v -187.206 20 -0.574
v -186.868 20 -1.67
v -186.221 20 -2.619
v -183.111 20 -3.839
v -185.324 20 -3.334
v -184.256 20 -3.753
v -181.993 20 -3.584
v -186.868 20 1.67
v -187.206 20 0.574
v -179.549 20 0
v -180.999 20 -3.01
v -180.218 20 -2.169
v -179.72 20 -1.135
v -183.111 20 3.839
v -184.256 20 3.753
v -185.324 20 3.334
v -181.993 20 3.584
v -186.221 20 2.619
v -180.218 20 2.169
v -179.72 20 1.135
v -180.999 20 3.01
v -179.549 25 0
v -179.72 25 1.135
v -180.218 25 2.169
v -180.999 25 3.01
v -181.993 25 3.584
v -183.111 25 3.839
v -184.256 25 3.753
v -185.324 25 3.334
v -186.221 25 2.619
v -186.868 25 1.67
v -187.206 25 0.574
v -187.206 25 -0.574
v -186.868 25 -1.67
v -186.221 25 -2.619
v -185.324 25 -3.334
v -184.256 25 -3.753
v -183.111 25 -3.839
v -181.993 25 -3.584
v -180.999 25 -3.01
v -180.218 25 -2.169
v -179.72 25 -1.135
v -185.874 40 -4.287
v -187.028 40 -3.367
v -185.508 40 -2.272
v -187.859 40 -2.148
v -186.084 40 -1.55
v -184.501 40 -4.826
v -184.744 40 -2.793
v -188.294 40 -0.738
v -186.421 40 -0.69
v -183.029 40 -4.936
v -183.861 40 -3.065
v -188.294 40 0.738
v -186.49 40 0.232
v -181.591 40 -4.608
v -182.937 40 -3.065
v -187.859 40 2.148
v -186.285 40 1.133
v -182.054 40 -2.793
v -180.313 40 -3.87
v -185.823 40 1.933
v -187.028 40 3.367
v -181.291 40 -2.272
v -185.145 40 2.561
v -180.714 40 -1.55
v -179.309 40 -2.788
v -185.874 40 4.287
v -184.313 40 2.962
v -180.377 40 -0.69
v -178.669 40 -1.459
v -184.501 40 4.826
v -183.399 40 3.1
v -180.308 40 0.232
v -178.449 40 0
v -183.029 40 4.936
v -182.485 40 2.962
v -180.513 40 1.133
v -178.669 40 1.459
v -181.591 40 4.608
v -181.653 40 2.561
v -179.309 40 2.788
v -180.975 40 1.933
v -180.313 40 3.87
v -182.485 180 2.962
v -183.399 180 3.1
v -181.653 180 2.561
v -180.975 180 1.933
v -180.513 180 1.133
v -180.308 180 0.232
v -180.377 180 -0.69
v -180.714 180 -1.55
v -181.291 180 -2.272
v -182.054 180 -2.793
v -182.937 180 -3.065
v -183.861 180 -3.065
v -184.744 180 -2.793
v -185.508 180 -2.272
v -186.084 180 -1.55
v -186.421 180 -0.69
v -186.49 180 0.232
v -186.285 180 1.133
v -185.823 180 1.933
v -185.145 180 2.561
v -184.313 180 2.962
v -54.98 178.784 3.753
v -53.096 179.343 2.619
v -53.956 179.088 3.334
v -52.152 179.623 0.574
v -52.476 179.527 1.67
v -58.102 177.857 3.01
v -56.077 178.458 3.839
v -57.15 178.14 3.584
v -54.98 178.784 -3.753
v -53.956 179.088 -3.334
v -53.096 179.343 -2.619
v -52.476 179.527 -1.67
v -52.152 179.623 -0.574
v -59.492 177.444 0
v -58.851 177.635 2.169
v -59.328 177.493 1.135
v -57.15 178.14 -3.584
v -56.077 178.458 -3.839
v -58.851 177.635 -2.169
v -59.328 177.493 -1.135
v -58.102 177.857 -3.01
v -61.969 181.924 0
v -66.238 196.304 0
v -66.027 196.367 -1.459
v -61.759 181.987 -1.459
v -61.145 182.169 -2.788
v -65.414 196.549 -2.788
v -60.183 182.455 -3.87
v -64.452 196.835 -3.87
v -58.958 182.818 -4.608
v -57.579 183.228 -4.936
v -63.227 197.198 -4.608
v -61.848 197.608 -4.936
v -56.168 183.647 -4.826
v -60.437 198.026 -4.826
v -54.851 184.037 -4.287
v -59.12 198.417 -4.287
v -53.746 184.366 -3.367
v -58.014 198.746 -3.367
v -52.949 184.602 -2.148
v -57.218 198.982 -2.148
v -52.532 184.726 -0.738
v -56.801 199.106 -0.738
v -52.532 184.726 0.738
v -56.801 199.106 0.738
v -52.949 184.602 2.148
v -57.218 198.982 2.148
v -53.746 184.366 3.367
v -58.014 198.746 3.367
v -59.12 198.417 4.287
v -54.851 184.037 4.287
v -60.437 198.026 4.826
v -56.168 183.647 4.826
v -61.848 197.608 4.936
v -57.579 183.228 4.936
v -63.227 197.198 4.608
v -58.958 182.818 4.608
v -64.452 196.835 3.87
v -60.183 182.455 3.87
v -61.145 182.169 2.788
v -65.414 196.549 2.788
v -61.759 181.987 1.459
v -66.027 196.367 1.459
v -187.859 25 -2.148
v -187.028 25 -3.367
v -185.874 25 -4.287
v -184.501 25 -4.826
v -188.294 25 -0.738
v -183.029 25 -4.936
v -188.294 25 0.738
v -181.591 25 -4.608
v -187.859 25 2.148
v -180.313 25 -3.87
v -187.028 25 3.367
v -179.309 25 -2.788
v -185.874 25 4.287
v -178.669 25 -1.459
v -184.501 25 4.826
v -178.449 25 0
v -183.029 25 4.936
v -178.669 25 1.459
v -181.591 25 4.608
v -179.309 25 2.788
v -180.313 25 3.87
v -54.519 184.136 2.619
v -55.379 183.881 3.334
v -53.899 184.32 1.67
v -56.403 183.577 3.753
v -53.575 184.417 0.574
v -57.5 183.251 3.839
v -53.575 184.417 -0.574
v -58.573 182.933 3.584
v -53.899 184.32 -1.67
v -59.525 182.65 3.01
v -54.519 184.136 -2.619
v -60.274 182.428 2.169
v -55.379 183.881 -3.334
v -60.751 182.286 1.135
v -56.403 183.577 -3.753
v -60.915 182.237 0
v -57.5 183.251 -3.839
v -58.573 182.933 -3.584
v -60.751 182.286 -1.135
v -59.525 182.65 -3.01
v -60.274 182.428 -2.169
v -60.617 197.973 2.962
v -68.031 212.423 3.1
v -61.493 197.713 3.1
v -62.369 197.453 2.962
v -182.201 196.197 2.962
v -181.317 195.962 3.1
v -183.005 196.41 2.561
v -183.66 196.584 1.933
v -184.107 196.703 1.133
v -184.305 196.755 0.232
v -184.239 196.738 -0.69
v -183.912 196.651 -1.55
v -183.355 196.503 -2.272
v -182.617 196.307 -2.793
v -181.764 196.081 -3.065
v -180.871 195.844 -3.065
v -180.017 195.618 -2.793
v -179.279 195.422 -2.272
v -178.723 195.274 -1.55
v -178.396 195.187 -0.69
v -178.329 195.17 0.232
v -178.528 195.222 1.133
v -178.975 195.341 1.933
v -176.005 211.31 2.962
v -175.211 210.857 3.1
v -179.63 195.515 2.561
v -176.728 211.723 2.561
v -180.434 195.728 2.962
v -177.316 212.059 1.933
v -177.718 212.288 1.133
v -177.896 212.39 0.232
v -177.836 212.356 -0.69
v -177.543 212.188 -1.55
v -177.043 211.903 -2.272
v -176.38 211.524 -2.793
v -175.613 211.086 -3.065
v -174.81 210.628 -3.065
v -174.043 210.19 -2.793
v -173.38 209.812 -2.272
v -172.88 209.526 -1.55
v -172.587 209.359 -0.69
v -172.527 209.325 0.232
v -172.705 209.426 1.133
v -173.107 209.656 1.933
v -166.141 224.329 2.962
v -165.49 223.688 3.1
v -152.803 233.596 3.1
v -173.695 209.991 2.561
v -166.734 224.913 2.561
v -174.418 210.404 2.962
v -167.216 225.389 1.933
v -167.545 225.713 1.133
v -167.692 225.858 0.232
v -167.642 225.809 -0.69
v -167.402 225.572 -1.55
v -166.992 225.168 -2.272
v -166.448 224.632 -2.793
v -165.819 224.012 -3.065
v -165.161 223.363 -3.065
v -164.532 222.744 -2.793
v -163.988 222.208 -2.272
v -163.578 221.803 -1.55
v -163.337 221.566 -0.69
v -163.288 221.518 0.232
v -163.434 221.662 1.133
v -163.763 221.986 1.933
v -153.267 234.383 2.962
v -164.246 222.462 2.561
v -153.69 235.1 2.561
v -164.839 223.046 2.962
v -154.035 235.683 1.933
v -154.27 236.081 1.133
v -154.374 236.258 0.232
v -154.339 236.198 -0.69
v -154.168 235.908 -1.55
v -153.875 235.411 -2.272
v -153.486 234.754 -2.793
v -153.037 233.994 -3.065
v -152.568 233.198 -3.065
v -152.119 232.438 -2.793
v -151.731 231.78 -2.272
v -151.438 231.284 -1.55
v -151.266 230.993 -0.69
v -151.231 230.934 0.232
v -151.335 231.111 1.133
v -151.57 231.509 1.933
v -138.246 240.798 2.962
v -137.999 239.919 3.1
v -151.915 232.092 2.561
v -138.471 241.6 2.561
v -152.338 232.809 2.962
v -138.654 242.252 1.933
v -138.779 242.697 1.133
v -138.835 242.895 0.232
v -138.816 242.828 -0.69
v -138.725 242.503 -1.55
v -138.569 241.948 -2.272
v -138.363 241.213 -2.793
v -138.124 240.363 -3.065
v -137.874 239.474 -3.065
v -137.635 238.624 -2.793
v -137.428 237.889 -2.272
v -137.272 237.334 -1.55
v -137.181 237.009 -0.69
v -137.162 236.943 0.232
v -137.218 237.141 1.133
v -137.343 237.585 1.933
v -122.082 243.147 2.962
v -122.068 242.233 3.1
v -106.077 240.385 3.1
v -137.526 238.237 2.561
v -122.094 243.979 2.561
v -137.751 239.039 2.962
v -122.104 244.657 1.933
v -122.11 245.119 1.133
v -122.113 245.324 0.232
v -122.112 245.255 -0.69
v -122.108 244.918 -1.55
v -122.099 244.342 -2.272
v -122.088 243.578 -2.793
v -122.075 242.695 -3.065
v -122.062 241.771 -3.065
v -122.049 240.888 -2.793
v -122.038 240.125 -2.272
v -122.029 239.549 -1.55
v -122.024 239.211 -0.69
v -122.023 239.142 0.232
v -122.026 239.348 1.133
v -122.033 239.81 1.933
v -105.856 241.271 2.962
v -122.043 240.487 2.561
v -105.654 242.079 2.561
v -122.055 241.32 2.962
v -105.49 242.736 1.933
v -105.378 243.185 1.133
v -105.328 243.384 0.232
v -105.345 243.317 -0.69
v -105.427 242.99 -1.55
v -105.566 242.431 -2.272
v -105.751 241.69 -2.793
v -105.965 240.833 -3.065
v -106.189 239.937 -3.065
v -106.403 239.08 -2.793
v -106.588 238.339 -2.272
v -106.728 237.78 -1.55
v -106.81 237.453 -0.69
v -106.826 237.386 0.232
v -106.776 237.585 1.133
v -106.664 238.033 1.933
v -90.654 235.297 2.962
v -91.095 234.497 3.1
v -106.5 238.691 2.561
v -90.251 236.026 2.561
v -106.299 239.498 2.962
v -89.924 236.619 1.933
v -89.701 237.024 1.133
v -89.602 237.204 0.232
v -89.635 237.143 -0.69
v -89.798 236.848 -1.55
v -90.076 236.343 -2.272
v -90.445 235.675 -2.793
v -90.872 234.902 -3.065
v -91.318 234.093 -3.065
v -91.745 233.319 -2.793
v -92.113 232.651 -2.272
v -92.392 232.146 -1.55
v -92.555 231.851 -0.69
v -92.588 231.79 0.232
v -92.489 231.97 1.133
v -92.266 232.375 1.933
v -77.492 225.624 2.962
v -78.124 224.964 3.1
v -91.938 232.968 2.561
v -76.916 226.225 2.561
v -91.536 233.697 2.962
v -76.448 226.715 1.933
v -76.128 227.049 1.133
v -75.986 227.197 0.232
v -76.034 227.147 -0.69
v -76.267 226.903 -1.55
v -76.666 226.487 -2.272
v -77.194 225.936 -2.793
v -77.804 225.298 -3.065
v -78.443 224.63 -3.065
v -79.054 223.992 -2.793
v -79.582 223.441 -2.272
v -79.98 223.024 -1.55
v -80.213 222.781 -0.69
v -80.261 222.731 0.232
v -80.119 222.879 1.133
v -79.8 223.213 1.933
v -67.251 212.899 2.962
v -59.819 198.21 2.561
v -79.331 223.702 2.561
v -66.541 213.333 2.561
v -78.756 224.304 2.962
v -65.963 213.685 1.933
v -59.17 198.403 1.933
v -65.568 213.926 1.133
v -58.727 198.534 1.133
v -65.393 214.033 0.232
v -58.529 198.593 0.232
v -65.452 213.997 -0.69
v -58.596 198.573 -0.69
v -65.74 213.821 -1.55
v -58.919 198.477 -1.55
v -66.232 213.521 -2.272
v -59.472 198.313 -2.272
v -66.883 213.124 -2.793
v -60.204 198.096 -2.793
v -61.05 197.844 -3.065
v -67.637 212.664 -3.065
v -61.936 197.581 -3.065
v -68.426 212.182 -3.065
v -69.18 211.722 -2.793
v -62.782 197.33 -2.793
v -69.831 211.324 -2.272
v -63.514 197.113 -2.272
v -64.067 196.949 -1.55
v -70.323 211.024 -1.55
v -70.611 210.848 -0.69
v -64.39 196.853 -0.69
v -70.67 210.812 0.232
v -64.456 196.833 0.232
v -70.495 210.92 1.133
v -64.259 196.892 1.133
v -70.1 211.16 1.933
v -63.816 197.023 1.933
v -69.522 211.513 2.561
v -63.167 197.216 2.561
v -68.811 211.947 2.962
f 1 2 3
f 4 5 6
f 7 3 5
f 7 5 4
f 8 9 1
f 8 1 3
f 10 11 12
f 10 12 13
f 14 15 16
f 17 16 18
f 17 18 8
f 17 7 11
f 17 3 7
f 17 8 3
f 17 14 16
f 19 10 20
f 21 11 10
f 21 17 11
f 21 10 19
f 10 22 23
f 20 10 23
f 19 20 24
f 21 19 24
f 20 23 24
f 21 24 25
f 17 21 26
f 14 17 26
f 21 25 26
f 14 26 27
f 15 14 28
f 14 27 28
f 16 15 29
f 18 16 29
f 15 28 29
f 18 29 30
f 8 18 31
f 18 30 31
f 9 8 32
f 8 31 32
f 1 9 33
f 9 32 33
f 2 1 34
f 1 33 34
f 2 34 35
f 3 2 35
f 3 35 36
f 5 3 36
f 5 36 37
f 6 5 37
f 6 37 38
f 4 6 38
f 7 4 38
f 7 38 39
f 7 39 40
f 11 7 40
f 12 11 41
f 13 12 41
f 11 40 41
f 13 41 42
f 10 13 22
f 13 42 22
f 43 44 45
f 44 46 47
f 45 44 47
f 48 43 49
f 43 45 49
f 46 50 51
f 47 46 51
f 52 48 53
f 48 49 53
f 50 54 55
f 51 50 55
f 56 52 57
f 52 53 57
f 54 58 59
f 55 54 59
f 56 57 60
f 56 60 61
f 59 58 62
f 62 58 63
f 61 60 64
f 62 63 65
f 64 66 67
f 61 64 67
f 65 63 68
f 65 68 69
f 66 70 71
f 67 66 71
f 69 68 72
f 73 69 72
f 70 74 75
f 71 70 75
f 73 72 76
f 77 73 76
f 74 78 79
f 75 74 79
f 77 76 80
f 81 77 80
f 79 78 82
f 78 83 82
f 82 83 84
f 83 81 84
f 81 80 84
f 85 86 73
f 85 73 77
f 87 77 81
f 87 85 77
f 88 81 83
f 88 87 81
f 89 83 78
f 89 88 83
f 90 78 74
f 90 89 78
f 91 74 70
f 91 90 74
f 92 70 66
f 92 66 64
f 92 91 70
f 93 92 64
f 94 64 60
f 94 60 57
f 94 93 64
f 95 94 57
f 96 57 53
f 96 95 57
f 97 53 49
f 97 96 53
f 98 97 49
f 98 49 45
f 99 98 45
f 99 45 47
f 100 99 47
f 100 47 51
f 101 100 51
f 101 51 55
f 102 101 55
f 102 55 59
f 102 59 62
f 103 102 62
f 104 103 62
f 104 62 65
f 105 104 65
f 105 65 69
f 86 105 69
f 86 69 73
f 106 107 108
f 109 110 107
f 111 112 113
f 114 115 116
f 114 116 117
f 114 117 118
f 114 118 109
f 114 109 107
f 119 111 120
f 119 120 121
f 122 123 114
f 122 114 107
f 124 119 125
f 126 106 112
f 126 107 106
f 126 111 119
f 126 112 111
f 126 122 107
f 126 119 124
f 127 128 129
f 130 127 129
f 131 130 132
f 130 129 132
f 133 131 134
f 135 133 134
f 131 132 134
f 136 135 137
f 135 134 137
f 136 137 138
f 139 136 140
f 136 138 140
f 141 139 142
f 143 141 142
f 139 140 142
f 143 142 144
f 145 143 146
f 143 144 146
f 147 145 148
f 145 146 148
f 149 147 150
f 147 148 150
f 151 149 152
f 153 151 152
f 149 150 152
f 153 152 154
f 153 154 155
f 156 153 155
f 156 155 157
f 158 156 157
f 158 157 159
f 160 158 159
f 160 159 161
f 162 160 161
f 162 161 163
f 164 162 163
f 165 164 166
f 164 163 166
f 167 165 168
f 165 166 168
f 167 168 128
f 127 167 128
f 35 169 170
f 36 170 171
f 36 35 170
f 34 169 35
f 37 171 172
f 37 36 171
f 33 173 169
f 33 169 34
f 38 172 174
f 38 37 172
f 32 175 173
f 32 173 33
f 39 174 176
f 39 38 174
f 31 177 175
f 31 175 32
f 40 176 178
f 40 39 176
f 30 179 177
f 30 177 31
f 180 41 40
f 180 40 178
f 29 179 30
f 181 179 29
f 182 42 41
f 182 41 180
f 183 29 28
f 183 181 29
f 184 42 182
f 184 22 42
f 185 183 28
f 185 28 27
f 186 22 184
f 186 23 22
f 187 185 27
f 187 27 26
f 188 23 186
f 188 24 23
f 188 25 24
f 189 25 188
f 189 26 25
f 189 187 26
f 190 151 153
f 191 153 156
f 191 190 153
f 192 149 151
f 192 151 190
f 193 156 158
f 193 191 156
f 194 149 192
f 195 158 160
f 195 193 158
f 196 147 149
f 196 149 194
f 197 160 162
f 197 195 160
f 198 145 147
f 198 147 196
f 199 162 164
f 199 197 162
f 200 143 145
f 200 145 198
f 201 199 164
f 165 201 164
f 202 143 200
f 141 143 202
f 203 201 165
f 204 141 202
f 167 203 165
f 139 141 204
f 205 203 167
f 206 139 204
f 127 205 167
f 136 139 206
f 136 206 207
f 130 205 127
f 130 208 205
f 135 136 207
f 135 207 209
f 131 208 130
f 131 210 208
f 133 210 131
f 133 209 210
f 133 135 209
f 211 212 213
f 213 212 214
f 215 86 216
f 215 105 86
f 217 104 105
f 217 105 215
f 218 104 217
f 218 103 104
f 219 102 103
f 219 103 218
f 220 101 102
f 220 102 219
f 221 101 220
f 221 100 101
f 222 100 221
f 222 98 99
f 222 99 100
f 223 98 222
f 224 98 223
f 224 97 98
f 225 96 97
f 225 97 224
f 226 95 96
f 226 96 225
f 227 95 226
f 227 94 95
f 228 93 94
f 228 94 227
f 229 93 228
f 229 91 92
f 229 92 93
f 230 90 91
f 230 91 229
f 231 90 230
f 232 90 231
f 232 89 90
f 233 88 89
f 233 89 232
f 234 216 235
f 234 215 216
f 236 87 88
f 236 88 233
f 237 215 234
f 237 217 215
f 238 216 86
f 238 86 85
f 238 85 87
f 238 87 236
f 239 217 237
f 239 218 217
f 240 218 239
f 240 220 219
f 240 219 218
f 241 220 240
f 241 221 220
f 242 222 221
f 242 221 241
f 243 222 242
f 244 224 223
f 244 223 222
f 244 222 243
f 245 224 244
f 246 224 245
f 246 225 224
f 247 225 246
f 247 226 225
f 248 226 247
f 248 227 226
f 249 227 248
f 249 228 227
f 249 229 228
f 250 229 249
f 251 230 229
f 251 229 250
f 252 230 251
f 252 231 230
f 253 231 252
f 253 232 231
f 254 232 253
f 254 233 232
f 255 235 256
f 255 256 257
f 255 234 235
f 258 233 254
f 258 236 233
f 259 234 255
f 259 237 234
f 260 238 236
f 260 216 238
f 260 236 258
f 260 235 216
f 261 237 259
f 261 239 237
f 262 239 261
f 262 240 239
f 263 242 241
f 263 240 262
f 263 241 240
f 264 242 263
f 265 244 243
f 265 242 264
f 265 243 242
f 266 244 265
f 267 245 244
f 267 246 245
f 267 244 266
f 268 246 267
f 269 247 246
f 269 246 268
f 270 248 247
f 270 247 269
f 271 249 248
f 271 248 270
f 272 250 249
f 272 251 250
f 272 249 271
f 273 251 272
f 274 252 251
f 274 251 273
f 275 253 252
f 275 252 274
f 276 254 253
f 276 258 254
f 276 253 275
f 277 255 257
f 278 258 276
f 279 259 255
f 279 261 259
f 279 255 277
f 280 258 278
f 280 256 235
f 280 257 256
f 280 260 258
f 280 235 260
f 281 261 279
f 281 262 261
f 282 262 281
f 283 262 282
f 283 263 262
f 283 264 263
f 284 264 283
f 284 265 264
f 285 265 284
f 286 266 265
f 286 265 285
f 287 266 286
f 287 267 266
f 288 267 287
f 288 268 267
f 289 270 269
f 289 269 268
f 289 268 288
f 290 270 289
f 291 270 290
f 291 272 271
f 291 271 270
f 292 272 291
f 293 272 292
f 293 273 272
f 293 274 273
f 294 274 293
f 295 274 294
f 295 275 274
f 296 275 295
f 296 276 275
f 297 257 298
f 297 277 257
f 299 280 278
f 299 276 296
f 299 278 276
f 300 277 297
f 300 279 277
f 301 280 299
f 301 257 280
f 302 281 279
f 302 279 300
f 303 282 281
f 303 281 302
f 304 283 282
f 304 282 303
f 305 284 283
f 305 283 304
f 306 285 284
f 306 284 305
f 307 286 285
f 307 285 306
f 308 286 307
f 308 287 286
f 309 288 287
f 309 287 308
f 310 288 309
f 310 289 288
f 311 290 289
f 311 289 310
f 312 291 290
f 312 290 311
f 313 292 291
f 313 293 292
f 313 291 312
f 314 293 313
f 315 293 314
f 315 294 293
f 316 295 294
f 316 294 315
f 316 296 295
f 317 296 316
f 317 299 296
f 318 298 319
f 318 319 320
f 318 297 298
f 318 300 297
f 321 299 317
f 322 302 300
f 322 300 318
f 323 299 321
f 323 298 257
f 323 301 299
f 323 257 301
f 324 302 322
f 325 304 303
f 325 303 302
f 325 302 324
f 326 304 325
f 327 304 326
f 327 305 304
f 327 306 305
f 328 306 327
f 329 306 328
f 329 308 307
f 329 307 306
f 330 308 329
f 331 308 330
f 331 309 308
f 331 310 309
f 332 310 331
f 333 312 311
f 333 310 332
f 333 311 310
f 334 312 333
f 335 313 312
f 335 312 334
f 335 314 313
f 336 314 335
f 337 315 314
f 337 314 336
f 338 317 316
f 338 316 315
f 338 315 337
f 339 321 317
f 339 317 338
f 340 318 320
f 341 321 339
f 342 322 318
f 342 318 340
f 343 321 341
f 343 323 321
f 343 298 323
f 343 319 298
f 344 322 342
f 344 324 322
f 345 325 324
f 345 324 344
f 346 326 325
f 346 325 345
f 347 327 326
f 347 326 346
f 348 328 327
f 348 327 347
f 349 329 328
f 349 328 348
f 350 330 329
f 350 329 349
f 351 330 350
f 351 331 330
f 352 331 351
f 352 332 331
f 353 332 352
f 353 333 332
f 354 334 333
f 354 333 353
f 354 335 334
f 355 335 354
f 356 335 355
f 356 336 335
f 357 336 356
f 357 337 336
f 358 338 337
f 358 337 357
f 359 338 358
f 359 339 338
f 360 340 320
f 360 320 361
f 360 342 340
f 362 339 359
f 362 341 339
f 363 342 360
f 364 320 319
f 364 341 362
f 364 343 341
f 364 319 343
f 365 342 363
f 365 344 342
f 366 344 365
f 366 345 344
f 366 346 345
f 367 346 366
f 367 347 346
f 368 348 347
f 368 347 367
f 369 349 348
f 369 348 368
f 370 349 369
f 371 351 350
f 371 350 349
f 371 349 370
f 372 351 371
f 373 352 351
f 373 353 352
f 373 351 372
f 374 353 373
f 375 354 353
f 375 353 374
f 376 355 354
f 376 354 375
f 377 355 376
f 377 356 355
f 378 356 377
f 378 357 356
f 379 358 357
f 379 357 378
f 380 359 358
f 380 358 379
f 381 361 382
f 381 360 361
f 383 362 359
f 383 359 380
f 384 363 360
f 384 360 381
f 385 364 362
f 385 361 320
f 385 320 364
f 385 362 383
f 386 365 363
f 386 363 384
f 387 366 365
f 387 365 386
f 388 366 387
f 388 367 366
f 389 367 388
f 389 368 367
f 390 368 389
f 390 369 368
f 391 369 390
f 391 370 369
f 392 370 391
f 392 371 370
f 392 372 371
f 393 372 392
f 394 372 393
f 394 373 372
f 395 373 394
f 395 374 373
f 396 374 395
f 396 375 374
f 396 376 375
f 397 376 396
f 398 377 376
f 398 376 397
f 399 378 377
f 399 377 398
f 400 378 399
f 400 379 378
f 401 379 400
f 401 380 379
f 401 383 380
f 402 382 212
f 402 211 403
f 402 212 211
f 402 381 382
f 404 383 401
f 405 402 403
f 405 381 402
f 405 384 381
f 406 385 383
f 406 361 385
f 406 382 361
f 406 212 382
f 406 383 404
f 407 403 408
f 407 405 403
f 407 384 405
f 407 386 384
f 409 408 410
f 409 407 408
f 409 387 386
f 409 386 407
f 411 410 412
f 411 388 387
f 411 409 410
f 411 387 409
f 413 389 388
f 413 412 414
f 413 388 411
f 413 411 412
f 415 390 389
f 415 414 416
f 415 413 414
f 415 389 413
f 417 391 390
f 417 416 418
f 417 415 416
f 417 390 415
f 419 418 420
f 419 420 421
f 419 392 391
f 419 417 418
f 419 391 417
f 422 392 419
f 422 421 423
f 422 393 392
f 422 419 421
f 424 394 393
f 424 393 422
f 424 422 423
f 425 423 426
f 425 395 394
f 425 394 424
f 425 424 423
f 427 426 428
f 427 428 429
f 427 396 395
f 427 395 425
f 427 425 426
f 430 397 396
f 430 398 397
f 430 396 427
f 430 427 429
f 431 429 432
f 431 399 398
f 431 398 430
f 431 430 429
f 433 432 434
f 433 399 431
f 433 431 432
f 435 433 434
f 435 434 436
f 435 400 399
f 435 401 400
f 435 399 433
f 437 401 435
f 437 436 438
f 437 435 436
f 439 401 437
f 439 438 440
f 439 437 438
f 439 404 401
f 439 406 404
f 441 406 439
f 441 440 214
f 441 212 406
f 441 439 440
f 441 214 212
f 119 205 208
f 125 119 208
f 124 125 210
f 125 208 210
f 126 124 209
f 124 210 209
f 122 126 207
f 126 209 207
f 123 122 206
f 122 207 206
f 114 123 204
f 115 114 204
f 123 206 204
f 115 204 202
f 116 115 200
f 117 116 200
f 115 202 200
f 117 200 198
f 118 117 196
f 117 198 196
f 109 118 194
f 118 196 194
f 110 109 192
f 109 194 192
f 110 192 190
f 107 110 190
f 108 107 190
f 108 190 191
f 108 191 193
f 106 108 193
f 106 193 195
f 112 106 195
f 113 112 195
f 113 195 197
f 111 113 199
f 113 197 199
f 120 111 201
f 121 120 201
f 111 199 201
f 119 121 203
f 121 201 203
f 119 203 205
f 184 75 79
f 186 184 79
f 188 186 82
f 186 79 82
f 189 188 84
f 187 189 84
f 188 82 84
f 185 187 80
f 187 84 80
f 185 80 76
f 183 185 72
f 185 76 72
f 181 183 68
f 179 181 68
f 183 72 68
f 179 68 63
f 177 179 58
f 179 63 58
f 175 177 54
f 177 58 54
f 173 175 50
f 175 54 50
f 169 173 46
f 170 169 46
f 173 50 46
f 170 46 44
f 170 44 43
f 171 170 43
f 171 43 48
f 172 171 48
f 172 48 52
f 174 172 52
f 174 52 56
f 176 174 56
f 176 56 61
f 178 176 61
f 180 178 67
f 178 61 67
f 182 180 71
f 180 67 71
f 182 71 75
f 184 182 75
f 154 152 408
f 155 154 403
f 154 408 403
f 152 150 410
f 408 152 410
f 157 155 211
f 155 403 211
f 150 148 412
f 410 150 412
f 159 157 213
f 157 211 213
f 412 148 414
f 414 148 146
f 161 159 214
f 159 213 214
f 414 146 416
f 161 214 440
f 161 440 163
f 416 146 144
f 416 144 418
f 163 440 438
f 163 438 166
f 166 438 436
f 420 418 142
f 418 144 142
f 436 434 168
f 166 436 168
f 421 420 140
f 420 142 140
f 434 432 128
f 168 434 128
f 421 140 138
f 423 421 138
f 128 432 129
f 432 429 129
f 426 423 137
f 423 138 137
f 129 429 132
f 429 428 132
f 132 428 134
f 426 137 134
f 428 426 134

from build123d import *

# Parameters (mm, degrees)
SWEEP3_PROFILE_R    = 3.1
SKETCH17_R          = 4.95
BOSS_EXTRUDE1_DEPTH = 15
SKETCH18_R          = 3.85
BOSS_EXTRUDE2_DEPTH = 5
SKETCH19_R          = 4.95
BOSS_EXTRUDE3_DEPTH = 15
SKETCH20_R          = 3.85
BOSS_EXTRUDE4_DEPTH = 5


with BuildPart() as part:
    # Sweep3: sweep along a path in Sketch9
    with BuildLine(Plane.XY) as sweep3_path:
        Line((-183.399133976, 40), (-183.399133976, 180))
        ThreePointArc((-183.399133976, 180), (-130.108654619, 241.593132461), (-61.492979679, 197.712860026))
    # Sweep3 profile (on start of the path) → Sweep3 (sweep)
    with BuildSketch(Plane(origin=(-183.399133976, 40, 0), x_dir=(0, 0, 1), z_dir=(0, 1, 0))):
        Circle(SWEEP3_PROFILE_R)
    sweep(path=sweep3_path.line)

    # Sketch17 → Boss-Extrude1 (add)
    with BuildSketch(Plane.XZ.offset(-40)):
        with Locations((-183.399133976, 0)):
            Circle(SKETCH17_R)
    extrude(amount=BOSS_EXTRUDE1_DEPTH)

    # Sketch18 → Boss-Extrude2 (add)
    with BuildSketch(Plane.XZ.offset(-25)):
        with Locations((-183.399133976, 0)):
            Circle(SKETCH18_R)
    extrude(amount=BOSS_EXTRUDE2_DEPTH)

    # Sketch19 → Boss-Extrude3 (add)
    with BuildSketch(Plane(origin=(-58.920841531, 198.476439545, 0), x_dir=(0.9586493060523679, 0.28459007011017384, 0), z_dir=(0.2845900701101738, -0.9586493060523678, 0))):
        with Locations(Location((-2.6830856, 0, 0), (0, 0, 180))):
            Circle(SKETCH19_R)
    extrude(amount=BOSS_EXTRUDE3_DEPTH)

    # Sketch20 → Boss-Extrude4 (add)
    with BuildSketch(Plane(origin=(-54.651990479, 184.096699954, 0), x_dir=(0.9586493060523679, 0.2845900701101739, 0), z_dir=(0.28459007011017384, -0.9586493060523678, 0))):
        with Locations(Location((-2.6830856, 0, 0), (0, 0, 180))):
            Circle(SKETCH20_R)
    extrude(amount=BOSS_EXTRUDE4_DEPTH)


solid = part.part
